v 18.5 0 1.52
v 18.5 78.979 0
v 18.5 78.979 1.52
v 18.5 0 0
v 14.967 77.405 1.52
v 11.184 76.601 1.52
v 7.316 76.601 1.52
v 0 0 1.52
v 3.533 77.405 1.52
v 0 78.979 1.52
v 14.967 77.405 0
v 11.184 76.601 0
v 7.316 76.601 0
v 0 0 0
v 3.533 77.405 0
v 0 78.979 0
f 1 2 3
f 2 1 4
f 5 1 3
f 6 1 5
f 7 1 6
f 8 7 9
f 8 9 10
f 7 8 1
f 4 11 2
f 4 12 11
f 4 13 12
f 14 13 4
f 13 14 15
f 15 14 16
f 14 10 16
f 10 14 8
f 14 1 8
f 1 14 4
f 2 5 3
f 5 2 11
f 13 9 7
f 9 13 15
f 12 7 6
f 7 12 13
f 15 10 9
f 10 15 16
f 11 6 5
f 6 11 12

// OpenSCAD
h = 20;
innerr = 10.5;
outerr = 12.5;
pennyradius = 10;
pennyheight = 1.52;
length1 = 10;

module curvedend() {
    difference() {
        cube([1.85*pennyradius, 100, pennyheight]);
        translate ([0.5*1.85*pennyradius, 95, 0]) cylinder(pennyheight, 1.85*pennyradius, 1.85*pennyradius);
    }
}

curvedend();
